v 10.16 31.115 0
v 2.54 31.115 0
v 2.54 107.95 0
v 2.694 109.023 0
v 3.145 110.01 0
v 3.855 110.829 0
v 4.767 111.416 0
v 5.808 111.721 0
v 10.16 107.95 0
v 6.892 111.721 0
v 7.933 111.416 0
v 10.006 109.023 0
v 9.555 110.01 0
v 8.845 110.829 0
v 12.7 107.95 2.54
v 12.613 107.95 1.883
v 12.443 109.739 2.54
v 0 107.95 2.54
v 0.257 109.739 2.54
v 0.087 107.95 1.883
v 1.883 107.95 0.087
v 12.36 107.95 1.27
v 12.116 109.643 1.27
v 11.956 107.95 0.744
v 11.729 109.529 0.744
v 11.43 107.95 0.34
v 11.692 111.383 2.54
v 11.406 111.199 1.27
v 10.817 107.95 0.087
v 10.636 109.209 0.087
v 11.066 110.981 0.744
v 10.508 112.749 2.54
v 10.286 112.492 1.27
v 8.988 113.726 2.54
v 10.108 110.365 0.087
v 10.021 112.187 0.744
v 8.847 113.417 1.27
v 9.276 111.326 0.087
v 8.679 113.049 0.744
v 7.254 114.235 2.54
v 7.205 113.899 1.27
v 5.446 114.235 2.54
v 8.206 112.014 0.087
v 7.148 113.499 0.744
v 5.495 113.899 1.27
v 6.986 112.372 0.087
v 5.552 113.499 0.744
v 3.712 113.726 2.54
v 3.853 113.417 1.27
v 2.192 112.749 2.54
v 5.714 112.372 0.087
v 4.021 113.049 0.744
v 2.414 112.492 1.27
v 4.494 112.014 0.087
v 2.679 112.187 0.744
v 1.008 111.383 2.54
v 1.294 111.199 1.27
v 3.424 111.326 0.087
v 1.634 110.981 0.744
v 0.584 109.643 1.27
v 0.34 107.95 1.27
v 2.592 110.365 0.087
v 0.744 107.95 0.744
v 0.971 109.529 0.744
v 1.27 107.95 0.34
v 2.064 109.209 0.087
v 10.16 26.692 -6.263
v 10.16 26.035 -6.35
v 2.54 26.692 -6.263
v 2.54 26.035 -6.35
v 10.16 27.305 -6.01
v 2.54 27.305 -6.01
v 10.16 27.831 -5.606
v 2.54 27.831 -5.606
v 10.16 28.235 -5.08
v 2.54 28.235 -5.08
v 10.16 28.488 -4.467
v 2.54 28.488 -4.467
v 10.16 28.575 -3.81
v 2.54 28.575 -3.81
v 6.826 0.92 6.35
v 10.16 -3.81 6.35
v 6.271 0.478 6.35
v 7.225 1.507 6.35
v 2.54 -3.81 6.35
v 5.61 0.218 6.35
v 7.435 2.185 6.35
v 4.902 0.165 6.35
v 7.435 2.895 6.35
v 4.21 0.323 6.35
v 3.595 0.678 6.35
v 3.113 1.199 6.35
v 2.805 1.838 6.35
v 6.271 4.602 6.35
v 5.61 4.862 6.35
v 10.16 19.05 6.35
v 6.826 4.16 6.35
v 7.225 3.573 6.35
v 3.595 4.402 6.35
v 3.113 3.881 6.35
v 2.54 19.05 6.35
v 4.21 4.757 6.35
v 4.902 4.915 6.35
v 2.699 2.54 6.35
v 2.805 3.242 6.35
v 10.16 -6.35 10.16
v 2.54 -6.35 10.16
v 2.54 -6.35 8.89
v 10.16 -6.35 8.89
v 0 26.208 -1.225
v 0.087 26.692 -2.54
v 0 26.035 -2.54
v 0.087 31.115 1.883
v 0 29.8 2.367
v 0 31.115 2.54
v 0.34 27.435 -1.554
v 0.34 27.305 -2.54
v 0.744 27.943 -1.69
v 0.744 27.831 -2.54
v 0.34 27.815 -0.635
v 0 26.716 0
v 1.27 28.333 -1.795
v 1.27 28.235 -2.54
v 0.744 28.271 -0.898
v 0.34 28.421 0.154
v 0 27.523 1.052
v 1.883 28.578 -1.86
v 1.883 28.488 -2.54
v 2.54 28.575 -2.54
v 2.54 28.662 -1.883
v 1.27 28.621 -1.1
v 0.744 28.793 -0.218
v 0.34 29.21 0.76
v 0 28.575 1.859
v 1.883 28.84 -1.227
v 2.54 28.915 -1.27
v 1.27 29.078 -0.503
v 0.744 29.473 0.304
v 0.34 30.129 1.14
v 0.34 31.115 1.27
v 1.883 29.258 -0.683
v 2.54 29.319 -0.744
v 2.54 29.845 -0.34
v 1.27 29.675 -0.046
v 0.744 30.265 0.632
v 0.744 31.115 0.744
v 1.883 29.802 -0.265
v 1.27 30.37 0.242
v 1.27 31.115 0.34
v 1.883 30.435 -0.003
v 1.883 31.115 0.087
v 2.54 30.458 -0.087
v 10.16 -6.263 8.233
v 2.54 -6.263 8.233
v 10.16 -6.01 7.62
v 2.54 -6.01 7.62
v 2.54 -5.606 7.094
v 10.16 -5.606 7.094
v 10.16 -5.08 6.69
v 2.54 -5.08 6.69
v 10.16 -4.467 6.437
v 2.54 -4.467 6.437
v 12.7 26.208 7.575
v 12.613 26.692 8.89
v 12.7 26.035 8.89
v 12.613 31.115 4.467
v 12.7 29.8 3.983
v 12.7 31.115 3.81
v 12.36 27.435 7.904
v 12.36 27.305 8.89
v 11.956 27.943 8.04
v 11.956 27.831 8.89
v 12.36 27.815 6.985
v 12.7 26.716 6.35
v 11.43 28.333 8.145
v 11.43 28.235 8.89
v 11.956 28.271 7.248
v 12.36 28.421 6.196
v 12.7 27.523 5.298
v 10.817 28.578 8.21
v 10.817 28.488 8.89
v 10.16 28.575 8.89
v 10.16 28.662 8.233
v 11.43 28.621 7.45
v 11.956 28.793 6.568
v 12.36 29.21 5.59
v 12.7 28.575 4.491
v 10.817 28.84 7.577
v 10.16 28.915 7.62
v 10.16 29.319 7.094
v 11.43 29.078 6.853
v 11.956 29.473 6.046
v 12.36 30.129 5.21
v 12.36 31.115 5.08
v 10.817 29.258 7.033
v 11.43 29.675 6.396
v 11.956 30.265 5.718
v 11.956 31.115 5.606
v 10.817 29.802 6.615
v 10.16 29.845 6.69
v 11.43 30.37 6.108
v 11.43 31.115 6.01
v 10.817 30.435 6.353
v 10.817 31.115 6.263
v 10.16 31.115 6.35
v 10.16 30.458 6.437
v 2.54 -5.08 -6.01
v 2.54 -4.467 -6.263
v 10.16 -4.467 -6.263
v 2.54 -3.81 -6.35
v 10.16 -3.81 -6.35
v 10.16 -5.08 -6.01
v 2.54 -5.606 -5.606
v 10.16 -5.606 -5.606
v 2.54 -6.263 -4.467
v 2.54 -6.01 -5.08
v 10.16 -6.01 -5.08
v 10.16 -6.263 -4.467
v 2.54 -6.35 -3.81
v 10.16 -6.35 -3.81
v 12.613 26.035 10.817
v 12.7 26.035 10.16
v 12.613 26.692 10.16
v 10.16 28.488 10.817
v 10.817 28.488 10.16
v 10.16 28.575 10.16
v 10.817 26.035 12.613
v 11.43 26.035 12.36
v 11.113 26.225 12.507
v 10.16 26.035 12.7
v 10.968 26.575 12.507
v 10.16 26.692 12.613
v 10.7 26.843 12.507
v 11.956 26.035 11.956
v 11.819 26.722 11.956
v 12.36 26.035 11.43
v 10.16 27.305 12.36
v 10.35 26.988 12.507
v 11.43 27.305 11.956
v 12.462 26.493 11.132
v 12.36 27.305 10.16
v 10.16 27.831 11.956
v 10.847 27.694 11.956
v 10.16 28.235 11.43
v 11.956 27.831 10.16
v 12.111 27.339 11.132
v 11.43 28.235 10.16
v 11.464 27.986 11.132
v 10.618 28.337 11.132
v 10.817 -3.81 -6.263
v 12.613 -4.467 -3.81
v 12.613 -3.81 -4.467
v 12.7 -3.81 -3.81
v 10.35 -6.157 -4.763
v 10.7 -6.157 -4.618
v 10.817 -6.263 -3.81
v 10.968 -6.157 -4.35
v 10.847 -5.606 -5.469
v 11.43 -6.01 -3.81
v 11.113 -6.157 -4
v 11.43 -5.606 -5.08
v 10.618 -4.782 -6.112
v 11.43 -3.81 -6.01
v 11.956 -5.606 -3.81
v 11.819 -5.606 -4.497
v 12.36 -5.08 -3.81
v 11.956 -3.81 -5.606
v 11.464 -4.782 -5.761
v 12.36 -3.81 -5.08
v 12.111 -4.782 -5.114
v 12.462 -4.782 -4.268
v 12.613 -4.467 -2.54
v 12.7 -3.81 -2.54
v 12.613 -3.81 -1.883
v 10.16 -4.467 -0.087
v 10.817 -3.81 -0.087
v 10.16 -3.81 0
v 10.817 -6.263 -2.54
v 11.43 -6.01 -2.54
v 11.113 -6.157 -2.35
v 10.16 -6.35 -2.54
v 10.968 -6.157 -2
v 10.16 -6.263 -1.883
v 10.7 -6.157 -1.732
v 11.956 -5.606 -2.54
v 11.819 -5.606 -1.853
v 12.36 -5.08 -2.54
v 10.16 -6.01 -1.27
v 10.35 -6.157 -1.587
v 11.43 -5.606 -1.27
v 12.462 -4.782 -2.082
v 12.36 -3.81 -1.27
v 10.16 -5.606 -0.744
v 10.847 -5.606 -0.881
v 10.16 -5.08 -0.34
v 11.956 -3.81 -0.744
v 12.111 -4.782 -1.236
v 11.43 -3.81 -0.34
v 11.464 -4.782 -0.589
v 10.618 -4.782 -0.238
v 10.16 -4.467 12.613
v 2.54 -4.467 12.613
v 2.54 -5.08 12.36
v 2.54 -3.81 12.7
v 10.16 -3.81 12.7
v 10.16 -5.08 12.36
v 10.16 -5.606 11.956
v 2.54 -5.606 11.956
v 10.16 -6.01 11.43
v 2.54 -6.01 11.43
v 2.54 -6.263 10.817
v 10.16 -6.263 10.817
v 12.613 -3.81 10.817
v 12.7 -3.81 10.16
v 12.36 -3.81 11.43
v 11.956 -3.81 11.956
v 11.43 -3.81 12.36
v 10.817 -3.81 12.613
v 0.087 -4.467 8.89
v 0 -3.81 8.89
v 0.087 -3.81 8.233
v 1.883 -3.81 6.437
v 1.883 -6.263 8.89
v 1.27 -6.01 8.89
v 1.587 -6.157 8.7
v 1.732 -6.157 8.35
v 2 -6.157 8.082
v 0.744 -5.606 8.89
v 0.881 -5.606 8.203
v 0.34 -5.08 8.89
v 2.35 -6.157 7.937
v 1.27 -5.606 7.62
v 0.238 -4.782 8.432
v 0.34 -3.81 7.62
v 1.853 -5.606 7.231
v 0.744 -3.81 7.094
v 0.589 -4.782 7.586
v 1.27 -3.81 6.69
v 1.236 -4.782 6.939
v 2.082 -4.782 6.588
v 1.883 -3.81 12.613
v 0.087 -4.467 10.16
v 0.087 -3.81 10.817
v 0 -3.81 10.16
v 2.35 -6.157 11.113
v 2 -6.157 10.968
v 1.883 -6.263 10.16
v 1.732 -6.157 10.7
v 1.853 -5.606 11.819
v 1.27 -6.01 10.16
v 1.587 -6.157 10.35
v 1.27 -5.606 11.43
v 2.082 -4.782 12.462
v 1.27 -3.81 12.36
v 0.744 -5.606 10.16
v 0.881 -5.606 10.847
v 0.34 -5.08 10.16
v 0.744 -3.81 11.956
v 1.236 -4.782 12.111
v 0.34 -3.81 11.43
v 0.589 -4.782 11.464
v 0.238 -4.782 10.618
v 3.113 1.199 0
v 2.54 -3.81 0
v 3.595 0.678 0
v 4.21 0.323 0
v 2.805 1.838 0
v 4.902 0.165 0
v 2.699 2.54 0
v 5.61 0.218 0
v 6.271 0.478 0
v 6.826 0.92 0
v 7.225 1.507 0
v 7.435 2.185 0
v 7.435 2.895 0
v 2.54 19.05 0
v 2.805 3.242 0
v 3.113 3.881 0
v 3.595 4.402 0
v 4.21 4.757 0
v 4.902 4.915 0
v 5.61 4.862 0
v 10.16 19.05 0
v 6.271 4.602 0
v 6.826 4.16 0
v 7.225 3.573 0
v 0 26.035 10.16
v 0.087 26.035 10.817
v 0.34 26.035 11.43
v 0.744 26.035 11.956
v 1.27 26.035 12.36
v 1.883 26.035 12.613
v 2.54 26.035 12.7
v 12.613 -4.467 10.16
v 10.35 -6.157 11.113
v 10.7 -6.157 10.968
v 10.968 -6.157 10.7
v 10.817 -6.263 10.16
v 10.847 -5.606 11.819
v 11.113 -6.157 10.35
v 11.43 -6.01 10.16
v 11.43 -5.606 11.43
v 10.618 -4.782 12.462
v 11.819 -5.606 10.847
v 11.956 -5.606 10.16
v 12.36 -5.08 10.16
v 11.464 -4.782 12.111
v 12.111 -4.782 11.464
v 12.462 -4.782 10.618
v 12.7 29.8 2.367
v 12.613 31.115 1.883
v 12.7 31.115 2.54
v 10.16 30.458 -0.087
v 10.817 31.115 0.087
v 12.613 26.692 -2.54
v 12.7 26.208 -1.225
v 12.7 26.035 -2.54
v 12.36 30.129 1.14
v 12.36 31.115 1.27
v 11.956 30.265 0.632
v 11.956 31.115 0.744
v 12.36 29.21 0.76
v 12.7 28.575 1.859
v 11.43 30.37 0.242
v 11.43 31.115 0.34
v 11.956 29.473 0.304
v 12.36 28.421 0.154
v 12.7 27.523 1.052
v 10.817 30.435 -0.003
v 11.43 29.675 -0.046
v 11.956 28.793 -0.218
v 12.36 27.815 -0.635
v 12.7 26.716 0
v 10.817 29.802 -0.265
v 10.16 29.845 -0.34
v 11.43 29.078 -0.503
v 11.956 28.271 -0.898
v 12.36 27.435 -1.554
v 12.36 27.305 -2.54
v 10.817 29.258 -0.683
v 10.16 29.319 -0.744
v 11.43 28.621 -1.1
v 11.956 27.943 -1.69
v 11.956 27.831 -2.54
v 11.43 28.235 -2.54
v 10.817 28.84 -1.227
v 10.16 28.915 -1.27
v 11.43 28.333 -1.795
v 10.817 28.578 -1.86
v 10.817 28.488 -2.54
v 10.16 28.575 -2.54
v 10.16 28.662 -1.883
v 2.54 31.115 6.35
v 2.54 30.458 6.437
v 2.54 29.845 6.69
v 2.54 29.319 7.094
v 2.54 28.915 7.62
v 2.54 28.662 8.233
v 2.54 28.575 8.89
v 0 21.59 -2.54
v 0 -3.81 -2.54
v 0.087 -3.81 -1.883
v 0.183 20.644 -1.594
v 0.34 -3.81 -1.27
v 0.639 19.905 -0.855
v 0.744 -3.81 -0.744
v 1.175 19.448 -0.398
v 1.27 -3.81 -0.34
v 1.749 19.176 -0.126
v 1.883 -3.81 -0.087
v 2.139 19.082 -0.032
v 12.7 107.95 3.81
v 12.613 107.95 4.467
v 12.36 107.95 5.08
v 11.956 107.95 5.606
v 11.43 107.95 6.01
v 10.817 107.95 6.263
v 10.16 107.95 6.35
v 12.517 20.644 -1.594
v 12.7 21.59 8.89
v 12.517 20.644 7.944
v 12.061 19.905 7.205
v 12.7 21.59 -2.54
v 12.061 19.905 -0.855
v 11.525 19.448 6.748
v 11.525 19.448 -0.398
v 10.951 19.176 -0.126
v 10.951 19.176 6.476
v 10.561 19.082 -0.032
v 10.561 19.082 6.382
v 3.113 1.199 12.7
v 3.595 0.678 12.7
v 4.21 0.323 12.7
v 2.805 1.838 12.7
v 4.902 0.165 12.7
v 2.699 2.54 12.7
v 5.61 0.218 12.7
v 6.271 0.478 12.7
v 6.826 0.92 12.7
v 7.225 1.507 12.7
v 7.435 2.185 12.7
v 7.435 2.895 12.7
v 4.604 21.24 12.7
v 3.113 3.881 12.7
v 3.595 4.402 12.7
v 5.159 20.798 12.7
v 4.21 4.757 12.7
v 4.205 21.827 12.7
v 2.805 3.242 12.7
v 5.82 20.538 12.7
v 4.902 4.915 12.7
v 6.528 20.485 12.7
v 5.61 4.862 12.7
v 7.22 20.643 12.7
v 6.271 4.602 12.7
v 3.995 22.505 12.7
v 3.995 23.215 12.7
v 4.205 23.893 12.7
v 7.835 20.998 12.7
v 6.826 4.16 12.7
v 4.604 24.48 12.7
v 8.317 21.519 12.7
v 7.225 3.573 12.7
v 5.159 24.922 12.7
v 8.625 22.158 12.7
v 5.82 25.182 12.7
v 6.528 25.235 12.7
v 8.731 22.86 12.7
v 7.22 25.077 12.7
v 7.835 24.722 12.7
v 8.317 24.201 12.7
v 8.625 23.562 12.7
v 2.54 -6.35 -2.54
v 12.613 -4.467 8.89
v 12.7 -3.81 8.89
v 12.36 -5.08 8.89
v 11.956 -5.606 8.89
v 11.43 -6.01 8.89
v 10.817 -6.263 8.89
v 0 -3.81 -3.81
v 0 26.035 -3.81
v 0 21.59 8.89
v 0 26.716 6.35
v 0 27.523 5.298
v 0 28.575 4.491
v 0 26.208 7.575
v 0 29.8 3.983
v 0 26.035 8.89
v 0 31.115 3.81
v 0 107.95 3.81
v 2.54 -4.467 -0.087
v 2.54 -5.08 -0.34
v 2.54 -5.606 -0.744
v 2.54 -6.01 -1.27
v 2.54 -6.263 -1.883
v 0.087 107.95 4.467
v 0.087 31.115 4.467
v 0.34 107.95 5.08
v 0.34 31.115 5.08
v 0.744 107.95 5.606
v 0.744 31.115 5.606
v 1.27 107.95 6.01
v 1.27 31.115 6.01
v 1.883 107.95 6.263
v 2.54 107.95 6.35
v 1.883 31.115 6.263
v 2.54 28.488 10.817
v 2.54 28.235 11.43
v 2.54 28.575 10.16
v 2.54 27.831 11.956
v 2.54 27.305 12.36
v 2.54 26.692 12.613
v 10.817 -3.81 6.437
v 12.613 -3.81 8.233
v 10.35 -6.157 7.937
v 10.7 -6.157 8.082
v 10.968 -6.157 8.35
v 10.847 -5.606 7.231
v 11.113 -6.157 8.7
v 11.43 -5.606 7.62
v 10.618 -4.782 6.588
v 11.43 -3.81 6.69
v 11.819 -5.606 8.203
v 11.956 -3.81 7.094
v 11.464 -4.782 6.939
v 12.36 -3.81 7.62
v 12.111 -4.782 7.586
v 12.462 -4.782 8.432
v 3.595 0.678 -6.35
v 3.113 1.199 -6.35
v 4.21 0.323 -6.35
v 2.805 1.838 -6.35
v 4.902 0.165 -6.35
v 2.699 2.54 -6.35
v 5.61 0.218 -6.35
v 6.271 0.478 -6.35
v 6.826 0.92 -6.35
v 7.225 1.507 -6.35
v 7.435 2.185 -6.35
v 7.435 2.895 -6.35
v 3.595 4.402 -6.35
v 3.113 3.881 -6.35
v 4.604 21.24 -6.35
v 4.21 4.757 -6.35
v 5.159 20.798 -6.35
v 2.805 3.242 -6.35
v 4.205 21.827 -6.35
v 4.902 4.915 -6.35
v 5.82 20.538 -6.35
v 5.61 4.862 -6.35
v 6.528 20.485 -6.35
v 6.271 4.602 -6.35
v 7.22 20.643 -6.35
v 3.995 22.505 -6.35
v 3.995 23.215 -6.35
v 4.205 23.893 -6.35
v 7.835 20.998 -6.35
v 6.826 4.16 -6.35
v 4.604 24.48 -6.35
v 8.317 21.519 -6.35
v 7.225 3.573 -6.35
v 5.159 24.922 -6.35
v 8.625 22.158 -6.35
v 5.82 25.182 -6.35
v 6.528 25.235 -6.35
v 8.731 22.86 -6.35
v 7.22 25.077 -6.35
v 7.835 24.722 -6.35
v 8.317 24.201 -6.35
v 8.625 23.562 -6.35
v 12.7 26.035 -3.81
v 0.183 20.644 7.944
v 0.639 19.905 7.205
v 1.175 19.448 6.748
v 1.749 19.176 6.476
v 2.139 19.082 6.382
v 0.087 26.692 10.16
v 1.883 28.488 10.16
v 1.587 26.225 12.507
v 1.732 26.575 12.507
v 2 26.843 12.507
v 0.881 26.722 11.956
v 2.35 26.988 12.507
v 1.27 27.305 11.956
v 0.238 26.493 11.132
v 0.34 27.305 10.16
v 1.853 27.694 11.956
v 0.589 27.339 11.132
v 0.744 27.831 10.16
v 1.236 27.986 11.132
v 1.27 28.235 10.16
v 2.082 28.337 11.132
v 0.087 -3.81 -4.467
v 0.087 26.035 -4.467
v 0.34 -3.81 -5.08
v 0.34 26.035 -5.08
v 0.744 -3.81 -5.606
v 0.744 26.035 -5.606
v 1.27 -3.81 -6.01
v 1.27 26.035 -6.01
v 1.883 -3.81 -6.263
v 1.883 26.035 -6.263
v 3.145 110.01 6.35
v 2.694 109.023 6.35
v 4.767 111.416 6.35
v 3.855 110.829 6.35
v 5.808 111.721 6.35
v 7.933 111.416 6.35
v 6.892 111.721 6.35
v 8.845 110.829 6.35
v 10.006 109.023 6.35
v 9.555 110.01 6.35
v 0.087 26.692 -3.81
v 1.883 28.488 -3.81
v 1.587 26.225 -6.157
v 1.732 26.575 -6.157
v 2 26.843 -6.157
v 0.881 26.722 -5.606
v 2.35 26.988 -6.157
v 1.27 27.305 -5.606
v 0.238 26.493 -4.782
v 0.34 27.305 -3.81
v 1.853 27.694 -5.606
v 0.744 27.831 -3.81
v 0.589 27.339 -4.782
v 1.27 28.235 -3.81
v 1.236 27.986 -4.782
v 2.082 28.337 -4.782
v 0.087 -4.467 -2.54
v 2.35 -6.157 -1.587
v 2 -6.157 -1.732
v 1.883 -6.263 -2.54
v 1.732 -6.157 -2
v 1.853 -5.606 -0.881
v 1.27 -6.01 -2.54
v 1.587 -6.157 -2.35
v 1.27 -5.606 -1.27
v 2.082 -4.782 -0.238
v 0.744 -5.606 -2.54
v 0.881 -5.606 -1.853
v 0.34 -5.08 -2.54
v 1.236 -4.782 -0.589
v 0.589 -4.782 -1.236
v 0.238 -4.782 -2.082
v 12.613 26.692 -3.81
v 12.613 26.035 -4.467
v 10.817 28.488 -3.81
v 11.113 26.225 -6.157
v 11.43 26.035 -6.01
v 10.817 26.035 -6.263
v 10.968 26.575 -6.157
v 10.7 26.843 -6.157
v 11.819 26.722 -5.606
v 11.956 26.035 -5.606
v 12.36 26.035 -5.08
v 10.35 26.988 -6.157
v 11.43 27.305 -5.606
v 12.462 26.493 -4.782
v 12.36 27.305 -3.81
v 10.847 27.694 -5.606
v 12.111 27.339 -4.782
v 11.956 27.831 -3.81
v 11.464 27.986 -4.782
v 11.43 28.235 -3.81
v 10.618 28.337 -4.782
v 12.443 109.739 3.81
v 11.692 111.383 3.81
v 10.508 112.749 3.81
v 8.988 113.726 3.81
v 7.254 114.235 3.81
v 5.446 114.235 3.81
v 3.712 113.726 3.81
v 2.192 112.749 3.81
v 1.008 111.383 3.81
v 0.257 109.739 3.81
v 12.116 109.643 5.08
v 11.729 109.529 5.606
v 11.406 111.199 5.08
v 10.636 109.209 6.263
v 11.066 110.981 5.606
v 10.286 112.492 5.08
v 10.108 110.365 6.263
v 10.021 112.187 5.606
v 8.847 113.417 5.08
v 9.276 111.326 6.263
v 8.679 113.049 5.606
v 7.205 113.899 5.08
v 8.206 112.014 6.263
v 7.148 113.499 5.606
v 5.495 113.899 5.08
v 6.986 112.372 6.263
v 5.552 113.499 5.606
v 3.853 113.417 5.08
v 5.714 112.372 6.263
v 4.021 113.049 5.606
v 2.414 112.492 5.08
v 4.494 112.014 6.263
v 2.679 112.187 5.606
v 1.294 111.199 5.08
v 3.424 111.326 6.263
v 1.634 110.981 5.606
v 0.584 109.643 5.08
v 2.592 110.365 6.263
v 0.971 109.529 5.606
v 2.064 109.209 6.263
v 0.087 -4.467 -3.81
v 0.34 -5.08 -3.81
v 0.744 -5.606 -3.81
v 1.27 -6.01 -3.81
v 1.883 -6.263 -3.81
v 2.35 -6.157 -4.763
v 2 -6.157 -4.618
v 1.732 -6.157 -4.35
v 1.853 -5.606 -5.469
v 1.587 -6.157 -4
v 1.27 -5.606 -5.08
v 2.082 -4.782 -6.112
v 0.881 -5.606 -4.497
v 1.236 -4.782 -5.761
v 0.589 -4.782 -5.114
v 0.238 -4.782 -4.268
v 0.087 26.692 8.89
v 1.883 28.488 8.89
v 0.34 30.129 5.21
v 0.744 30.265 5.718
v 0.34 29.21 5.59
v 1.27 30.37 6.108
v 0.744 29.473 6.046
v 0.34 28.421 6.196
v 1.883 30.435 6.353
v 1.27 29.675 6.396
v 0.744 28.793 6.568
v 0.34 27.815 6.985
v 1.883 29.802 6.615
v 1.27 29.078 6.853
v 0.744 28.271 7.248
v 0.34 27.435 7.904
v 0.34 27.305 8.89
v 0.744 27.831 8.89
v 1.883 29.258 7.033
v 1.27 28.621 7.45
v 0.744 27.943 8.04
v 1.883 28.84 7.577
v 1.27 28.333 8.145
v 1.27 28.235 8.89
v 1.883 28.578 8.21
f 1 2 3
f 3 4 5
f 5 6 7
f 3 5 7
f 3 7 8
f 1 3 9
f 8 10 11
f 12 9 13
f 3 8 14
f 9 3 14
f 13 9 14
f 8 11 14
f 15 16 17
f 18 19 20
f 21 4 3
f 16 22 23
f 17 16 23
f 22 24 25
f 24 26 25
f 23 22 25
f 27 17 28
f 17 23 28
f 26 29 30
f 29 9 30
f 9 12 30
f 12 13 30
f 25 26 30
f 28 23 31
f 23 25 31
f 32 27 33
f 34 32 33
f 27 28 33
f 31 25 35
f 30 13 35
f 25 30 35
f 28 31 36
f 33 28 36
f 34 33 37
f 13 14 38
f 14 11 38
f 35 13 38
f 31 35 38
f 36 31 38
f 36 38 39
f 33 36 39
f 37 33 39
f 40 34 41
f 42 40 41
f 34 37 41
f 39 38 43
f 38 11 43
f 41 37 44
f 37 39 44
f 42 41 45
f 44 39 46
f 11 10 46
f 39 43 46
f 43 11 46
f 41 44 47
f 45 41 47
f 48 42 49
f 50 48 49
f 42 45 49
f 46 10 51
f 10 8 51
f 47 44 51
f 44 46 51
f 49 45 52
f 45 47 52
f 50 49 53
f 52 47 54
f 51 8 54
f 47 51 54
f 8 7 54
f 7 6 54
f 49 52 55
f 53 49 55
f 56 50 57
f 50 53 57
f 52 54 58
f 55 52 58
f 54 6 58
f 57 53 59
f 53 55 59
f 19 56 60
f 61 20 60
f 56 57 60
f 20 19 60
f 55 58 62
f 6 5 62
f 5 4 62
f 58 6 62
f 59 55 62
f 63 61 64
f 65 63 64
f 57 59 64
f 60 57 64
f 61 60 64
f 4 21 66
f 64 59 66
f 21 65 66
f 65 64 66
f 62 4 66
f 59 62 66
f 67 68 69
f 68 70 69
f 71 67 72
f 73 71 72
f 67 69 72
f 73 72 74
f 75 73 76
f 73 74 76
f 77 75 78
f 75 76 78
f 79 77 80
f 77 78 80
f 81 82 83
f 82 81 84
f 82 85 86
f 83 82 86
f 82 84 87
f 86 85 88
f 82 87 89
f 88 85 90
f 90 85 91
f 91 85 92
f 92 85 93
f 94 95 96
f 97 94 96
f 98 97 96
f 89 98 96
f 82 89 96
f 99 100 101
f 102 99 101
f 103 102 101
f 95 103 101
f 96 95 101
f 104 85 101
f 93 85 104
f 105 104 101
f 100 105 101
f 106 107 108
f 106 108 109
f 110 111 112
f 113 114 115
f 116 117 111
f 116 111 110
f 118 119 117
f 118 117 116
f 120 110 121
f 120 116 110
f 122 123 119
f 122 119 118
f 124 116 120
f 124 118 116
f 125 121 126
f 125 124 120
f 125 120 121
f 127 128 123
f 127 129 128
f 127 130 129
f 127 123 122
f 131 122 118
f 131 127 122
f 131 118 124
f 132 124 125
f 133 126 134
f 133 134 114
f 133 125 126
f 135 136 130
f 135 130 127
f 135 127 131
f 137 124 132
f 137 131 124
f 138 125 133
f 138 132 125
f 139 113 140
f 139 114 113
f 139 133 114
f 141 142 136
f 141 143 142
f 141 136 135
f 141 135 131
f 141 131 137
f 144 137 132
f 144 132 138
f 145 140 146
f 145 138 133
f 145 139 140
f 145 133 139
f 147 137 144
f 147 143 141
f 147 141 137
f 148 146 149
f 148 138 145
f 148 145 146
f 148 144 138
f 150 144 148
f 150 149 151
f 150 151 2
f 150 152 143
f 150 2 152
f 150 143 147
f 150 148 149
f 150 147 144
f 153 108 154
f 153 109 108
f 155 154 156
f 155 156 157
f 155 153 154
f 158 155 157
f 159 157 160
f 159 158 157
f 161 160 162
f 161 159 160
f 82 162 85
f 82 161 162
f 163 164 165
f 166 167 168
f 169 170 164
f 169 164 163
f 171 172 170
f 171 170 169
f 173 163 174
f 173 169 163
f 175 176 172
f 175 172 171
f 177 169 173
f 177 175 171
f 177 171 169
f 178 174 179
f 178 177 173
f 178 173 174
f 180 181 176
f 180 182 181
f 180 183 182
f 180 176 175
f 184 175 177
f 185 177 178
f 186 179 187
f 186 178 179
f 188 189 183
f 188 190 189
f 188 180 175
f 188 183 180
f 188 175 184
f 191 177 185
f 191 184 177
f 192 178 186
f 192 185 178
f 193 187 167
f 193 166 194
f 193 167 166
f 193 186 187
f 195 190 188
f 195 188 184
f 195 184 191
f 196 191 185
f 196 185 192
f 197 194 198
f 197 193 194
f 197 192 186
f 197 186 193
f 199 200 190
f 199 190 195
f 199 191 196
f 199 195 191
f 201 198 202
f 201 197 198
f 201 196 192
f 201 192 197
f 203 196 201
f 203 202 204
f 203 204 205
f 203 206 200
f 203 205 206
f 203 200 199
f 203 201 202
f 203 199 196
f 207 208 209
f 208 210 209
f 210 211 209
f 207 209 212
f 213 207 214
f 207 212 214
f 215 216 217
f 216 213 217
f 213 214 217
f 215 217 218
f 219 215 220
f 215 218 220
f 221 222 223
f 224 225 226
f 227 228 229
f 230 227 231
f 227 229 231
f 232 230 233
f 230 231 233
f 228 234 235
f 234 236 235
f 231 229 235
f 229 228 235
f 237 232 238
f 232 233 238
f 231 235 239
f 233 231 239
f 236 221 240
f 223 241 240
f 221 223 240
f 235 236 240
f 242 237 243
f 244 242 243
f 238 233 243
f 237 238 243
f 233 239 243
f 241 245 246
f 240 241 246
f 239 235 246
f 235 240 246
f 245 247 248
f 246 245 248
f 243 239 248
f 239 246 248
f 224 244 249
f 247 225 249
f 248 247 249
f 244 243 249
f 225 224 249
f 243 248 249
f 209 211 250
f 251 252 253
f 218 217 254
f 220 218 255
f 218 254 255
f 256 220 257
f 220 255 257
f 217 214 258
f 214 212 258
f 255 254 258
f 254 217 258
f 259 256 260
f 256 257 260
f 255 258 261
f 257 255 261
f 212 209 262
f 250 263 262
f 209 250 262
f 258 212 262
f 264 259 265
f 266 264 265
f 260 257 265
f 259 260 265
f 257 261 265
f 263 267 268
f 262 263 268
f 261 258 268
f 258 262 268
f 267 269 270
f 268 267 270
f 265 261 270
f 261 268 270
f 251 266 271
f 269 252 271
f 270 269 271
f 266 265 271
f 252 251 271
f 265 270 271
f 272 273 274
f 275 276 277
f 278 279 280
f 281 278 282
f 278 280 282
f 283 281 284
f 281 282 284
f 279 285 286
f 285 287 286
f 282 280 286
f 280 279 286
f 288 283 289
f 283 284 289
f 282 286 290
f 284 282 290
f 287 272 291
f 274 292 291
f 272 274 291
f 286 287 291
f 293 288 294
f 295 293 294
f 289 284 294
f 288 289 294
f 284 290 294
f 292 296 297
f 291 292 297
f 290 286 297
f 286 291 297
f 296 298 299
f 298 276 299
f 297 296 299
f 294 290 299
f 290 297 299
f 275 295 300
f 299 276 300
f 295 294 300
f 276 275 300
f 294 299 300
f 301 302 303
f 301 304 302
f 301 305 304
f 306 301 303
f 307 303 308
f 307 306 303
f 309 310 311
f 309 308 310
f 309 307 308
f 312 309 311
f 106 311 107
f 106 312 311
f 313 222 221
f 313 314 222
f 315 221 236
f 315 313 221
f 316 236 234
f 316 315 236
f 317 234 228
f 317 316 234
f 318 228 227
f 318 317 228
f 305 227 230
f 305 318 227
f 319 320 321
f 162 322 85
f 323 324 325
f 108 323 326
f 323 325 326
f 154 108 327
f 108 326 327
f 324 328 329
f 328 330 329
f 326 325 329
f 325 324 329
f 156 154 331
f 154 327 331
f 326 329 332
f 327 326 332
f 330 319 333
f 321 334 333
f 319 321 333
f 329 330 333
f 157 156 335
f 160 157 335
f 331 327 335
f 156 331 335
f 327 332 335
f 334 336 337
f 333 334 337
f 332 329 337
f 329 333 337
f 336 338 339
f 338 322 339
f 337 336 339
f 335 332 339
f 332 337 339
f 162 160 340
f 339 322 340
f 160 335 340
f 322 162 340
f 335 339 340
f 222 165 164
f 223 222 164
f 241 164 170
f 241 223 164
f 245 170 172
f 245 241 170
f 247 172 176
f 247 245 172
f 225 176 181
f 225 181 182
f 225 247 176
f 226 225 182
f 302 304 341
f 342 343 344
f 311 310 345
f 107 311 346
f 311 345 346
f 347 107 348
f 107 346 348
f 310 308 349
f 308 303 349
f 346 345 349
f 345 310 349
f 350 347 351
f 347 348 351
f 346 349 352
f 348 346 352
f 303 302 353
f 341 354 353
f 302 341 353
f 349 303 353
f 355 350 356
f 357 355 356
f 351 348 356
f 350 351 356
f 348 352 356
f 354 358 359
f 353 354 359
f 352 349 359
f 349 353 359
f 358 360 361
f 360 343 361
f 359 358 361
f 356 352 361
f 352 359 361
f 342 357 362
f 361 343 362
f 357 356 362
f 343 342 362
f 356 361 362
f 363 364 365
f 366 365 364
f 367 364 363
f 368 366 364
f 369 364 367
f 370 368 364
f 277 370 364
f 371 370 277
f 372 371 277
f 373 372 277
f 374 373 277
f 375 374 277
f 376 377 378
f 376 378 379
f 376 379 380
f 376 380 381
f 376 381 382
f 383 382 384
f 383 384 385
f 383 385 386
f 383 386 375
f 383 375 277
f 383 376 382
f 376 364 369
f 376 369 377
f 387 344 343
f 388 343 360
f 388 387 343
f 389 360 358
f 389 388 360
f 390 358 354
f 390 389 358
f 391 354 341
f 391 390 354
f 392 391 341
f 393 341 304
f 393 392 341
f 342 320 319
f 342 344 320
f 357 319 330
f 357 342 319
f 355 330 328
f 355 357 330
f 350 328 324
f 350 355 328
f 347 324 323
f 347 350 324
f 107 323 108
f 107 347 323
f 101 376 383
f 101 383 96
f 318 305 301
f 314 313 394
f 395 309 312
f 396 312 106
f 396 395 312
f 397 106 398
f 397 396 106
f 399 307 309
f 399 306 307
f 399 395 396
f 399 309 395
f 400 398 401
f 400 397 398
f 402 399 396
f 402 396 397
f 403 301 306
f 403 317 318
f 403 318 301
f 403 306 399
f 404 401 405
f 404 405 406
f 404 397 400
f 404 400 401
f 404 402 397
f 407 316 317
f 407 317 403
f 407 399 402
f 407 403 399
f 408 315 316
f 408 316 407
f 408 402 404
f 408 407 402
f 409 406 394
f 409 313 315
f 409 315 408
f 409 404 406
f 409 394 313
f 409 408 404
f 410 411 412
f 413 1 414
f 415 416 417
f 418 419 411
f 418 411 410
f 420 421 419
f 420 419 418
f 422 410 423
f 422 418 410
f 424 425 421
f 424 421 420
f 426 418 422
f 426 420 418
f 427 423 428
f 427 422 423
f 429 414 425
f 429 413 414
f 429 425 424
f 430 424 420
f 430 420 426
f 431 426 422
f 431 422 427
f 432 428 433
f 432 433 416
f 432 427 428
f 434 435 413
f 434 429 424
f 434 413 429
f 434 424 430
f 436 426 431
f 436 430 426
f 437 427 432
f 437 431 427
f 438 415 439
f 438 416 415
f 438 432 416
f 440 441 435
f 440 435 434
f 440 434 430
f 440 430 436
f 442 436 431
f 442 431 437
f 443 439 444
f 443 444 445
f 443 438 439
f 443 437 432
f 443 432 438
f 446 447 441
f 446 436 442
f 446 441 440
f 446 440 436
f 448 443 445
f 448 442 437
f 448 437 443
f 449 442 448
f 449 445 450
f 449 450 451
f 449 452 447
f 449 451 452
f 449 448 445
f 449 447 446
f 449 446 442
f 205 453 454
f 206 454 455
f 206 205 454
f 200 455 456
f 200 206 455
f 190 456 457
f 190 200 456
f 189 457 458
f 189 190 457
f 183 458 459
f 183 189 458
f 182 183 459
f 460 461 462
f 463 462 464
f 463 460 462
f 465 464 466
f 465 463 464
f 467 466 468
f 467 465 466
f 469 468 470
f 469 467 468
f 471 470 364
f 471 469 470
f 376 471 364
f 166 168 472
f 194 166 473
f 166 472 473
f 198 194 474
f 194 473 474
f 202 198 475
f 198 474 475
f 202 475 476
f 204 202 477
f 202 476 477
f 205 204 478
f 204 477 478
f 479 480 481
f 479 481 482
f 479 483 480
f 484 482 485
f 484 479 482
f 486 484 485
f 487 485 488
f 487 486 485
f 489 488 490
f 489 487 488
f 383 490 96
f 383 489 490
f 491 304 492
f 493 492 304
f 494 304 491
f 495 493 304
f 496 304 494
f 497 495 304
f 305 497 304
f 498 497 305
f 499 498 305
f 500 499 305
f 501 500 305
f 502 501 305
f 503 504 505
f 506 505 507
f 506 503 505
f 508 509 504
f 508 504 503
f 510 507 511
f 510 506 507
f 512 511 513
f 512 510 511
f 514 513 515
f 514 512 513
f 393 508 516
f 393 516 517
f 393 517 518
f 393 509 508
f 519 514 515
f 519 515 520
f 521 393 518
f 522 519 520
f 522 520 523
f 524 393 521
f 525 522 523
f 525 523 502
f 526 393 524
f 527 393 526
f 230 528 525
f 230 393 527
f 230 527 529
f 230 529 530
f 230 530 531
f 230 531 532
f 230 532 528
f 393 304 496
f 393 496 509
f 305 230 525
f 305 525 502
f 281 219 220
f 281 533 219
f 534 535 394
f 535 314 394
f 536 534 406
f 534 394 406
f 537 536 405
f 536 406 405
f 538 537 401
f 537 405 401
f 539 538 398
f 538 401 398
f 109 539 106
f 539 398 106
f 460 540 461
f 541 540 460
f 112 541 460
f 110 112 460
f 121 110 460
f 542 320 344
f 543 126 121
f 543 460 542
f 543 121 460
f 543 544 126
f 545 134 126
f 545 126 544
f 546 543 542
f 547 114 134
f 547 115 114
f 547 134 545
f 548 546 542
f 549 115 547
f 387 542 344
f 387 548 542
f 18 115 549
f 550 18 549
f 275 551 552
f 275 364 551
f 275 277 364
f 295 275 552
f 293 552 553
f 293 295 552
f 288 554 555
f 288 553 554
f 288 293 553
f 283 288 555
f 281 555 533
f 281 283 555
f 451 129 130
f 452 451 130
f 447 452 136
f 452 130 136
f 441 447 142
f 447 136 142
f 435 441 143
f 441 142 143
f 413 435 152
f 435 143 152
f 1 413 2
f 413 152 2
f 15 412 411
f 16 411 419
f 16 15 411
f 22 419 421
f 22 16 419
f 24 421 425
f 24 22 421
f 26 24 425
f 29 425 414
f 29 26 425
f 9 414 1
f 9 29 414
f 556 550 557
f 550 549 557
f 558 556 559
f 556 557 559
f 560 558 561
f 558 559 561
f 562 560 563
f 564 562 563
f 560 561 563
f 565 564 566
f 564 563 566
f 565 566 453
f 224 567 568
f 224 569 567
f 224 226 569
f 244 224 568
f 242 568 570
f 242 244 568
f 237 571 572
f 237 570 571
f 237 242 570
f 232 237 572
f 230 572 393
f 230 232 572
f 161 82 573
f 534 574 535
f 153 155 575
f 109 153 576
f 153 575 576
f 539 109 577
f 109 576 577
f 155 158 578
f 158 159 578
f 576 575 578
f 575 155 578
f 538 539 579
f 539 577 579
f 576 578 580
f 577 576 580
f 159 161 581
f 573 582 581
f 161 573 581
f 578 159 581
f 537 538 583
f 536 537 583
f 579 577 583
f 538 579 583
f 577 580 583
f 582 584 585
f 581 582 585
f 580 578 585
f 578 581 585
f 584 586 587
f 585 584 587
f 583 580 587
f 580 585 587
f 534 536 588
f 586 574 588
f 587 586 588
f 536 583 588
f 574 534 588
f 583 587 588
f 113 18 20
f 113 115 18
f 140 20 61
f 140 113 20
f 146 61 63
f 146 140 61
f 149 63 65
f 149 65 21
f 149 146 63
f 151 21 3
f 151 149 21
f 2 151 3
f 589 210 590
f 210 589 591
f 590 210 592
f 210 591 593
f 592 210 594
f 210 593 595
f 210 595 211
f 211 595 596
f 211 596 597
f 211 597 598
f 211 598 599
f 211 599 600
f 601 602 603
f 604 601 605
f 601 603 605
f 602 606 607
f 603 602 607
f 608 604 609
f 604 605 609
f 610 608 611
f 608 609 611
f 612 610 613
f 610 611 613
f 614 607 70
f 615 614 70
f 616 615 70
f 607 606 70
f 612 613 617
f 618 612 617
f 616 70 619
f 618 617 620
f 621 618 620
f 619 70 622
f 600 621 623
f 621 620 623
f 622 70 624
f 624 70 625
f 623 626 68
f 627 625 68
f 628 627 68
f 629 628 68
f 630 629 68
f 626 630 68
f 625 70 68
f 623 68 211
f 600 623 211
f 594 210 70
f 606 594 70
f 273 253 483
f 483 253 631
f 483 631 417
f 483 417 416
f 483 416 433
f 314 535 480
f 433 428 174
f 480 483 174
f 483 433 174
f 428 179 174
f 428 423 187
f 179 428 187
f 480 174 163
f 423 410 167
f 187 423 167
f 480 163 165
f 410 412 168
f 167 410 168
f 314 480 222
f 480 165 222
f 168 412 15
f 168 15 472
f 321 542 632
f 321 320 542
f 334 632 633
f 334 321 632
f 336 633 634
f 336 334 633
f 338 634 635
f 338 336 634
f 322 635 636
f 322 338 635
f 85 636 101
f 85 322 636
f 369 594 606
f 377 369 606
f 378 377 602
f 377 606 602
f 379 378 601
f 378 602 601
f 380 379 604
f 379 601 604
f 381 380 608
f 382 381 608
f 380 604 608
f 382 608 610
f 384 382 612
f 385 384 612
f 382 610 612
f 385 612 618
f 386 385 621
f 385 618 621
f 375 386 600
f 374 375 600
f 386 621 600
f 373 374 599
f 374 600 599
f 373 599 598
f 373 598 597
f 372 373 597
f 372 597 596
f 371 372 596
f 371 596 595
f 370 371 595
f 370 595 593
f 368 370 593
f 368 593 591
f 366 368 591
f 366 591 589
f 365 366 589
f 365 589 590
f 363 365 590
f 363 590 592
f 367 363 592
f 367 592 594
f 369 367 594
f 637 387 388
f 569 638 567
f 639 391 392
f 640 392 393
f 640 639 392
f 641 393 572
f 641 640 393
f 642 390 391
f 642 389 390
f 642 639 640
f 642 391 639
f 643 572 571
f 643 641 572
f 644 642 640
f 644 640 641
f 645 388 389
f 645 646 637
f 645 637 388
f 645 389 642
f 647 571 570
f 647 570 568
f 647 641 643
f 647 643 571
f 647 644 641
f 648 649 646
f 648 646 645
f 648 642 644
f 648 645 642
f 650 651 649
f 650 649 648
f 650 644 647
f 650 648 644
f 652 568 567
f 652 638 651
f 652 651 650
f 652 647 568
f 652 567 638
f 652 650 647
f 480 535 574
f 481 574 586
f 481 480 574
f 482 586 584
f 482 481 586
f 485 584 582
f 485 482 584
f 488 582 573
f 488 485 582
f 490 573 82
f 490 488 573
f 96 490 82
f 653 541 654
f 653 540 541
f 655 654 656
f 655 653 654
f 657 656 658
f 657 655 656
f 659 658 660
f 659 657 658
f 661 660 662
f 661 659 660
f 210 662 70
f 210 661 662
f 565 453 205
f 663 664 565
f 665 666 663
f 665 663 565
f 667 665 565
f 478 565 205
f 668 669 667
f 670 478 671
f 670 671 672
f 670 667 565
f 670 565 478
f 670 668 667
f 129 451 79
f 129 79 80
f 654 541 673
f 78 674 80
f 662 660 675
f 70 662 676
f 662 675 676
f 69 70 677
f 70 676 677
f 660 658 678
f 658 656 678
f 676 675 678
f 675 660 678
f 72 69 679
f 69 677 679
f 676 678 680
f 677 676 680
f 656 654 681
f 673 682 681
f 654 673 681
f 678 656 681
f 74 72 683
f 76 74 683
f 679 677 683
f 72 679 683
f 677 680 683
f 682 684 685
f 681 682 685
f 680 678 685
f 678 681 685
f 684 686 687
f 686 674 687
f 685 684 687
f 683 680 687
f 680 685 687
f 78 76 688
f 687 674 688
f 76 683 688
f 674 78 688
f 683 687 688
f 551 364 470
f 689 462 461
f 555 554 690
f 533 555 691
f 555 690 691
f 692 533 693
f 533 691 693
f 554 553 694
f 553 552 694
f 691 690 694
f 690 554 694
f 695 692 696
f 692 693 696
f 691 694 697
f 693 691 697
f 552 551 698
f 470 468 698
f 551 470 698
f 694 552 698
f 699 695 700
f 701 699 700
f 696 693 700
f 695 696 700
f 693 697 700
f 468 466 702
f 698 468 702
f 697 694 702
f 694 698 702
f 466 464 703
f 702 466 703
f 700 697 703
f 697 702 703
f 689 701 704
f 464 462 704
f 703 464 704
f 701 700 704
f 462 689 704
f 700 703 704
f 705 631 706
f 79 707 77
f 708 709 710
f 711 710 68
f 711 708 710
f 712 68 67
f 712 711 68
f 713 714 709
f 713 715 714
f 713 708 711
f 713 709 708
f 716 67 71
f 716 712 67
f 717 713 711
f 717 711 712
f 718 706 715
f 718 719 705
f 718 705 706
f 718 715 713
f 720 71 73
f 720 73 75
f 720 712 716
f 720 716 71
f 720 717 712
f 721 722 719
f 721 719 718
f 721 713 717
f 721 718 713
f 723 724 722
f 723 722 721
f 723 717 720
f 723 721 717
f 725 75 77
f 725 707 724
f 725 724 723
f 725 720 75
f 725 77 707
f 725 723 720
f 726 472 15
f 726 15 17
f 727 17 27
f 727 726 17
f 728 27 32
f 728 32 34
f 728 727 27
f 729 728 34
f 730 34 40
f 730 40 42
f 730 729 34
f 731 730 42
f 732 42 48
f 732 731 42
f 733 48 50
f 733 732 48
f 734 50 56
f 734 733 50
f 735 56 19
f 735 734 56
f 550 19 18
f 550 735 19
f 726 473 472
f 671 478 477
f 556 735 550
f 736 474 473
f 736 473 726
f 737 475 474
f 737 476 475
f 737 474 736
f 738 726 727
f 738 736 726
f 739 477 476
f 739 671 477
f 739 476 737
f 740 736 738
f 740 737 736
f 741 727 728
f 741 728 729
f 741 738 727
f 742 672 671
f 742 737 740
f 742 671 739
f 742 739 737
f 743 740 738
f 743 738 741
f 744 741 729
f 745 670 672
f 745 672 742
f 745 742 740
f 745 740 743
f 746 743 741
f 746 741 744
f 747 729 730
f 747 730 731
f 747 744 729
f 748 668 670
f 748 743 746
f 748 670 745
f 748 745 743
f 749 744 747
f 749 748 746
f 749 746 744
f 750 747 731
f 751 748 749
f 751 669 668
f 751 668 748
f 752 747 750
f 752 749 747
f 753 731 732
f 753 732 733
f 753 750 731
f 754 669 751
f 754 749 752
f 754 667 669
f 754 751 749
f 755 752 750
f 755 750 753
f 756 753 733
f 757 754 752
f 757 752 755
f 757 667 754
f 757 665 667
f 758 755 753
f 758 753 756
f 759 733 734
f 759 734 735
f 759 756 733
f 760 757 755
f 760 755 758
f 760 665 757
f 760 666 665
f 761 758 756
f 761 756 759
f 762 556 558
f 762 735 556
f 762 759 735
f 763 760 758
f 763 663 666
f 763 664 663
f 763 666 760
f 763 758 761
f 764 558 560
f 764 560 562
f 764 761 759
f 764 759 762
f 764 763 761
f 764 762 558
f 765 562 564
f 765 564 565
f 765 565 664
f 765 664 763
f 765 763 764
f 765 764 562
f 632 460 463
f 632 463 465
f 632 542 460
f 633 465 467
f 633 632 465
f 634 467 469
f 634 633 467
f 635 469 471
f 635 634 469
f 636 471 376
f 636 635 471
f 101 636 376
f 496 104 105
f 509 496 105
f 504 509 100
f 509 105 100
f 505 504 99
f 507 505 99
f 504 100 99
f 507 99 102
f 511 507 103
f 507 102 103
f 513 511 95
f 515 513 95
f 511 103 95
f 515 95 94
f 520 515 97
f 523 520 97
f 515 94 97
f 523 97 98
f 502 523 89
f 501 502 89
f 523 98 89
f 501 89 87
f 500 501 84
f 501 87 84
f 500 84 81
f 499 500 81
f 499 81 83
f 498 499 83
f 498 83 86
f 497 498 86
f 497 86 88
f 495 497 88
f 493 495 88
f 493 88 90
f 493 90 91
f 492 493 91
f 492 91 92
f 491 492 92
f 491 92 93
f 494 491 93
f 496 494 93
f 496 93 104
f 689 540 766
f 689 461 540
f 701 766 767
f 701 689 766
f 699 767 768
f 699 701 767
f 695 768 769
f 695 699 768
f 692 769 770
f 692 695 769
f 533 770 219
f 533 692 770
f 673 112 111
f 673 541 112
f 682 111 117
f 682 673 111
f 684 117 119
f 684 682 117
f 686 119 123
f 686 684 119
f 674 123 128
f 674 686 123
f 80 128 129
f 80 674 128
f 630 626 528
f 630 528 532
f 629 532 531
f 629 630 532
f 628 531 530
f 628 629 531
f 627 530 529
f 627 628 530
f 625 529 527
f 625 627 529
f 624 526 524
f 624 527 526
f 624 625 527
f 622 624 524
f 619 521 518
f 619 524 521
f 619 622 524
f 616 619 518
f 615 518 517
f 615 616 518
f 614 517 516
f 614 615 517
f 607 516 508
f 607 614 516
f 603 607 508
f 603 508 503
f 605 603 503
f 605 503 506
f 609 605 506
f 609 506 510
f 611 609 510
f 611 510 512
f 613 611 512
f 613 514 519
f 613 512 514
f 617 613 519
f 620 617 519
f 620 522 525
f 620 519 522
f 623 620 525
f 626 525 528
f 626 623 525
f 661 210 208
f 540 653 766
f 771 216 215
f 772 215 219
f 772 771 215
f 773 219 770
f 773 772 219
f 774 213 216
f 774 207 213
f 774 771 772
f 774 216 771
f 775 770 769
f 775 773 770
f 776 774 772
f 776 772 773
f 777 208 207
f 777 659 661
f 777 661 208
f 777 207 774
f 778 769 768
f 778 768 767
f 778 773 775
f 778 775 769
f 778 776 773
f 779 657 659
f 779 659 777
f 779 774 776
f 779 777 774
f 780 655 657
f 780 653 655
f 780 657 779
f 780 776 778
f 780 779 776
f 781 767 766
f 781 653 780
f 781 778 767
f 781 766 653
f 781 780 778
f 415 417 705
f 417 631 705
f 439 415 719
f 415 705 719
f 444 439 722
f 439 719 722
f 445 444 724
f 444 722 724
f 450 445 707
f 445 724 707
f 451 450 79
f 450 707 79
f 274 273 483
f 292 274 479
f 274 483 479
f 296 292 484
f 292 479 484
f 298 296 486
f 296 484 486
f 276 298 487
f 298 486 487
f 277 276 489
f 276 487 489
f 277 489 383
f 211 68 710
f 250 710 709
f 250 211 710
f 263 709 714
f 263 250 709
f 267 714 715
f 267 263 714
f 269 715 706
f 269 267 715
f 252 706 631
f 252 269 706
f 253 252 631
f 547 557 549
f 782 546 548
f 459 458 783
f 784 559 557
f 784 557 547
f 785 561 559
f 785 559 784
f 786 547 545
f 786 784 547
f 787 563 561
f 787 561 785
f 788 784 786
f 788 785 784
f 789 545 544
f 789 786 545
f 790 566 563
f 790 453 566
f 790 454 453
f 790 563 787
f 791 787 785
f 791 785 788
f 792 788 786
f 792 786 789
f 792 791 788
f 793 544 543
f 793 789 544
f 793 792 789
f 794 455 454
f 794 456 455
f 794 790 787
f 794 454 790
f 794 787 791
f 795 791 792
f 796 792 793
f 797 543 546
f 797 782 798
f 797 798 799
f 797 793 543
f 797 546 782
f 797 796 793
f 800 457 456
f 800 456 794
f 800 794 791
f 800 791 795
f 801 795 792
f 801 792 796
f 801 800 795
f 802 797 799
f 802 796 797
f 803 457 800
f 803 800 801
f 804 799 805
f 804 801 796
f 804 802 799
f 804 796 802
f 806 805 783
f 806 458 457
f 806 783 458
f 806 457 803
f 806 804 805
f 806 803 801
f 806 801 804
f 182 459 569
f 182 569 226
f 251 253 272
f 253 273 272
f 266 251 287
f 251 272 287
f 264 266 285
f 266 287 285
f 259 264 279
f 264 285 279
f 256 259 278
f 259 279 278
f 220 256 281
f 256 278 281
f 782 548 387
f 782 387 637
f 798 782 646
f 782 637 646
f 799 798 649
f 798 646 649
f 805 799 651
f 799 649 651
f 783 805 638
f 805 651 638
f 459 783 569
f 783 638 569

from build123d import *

# Parameters (mm, degrees)
SKETCH1_W                       = 12.7
SKETCH1_H                       = 114.3
BOSS_EXTRUDE1_DEPTH             = 6.35
SKETCH4_W                       = 12.7
SKETCH4_H                       = 28.575
BOSS_EXTRUDE3_DEPTH             = 6.35
SKETCH5_W                       = 12.7
SKETCH5_H                       = 28.575
BOSS_EXTRUDE4_DEPTH             = 6.35
SKETCH7_W                       = 6.35
SKETCH7_H                       = 19.05
CUT_EXTRUDE2_DEPTH              = 32.512
CUT_EXTRUDE3_DEPTH              = 116.702506455
CUT_EXTRUDE3_DEPTH_BACK         = 116.702506455
SKETCH8_R                       = 2.38125
FILLET5_RADIUS                  = 6.35
FILLET5_LENGTH                  = 6.35
SKETCH9_W                       = 12.7
SKETCH9_H                       = 6.35
BOSS_EXTRUDE5_DEPTH             = 6.35
FILLET6_R                       = 2.54
F_3_16_0_1875_DOWEL_HOLE1_D     = 4.7625
F_3_16_0_1875_DOWEL_HOLE1_DEPTH = 23.368
F_3_16_0_1875_DOWEL_HOLE1_TIP   = 1.430799349


with BuildPart() as part:
    # Sketch1 → Boss-Extrude1 (new body)
    with BuildSketch(Plane.XY):
        with Locations((6.35, 57.15)):
            Rectangle(SKETCH1_W, SKETCH1_H)
    extrude(amount=BOSS_EXTRUDE1_DEPTH)

    # Sketch4 → Boss-Extrude3 (add)
    with BuildSketch(Plane.XY.offset(6.35)):
        with Locations((6.35, 14.2875)):
            Rectangle(SKETCH4_W, SKETCH4_H)
    extrude(amount=BOSS_EXTRUDE3_DEPTH)

    # Sketch5 → Boss-Extrude4 (add)
    with BuildSketch(Plane(origin=(0, 0, 0), x_dir=(-1, 0, 0), z_dir=(0, 0, -1))):
        with Locations((-6.35, 14.2875)):
            Rectangle(SKETCH5_W, SKETCH5_H)
    extrude(amount=BOSS_EXTRUDE4_DEPTH)

    # Sketch7 → Cut-Extrude2 (cut)
    with BuildSketch(Plane.ZY):
        with Locations((3.175, 9.525)):
            Rectangle(SKETCH7_W, SKETCH7_H)
    extrude(amount=-CUT_EXTRUDE2_DEPTH, mode=Mode.SUBTRACT)

    # Sketch8 → Cut-Extrude3 (cut, two sides: drawn at the far end of the back side and taken through both)
    with BuildSketch(Plane.XY.offset(6.35).offset(-CUT_EXTRUDE3_DEPTH_BACK)):
        with Locations((6.35, 22.86)):
            Circle(SKETCH8_R)
    extrude(amount=CUT_EXTRUDE3_DEPTH + CUT_EXTRUDE3_DEPTH_BACK, mode=Mode.SUBTRACT)

    # Fillet5: full round fillet: the end face becomes a half cylinder, R = half its width
    fillet5_face = Plane((6.35, 114.3, 3.175), x_dir=(0, 0, 1), z_dir=(0, 1, 0))  # on the end face: x along it, z out of the body
    fillet5_slab = fillet5_face.offset(-FILLET5_RADIUS / 2) * Box(FILLET5_LENGTH, 2 * FILLET5_RADIUS, FILLET5_RADIUS, mode=Mode.PRIVATE)  # the body's end, R deep
    fillet5_round = Plane((6.35, 107.95, 3.175), x_dir=(0, 1, 0), z_dir=(0, 0, 1)) * Cylinder(FILLET5_RADIUS, FILLET5_LENGTH, mode=Mode.PRIVATE)  # its axis R under the face
    add(fillet5_slab - fillet5_round, mode=Mode.SUBTRACT)

    # Sketch9 → Boss-Extrude5 (add)
    with BuildSketch(Plane.XZ):
        with Locations((6.35, -3.175)):
            Rectangle(SKETCH9_W, SKETCH9_H)
        with Locations((6.35, 9.525)):
            Rectangle(SKETCH9_W, SKETCH9_H)
    extrude(amount=BOSS_EXTRUDE5_DEPTH)

    # Fillet6
    fillet6_edges = [part.edges().sort_by_distance(p)[0] for p in [
        (12.7, 68.2625, 6.35),
        (0, 28.575, 9.525),
        (6.35, 28.575, 6.35),
        (12.7, 28.575, 9.525),
        (0, 11.1125, 12.7),
        (12.7, 11.1125, 12.7),
        (6.35, 28.575, 12.7),
        (12.7, 68.2625, 0),
        (12.7, 28.575, -3.175),
        (6.35, 28.575, 0),
        (0, 28.575, -3.175),
        (12.7, 14.2875, -6.35),
        (0, 14.2875, -6.35),
        (6.35, 28.575, -6.35),
        (12.7, 9.525, 6.35),
        (12.7, 19.05, 3.175),
        (12.7, 9.525, 0),
        (0, 9.525, 0),
        (0, 9.525, 6.35),
        (0, 19.05, 3.175),
        (0, 68.2625, 6.35),
        (0, 68.2625, 0),
        (6.35, 114.3, 0),
        (6.35, 114.3, 6.35),
        (6.35, -6.35, -6.35),
        (12.7, -6.35, -3.175),
        (6.35, -6.35, 0),
        (0, -6.35, -3.175),
        (6.35, -6.35, 12.7),
        (0, -6.35, 9.525),
        (6.35, -6.35, 6.35),
        (12.7, -6.35, 9.525),
    ]]
    fillet(fillet6_edges, radius=FILLET6_R)

    # 3/16 (0.1875) Dowel Hole1
    with Locations(Plane.XY.offset(12.7)):
        with Locations((5.08, 2.54)):
            Hole(F_3_16_0_1875_DOWEL_HOLE1_D / 2, depth=F_3_16_0_1875_DOWEL_HOLE1_DEPTH)
            with Locations((0, 0, -(F_3_16_0_1875_DOWEL_HOLE1_DEPTH + F_3_16_0_1875_DOWEL_HOLE1_TIP / 2))):  # 118° drill point
                Cone(0, F_3_16_0_1875_DOWEL_HOLE1_D / 2, F_3_16_0_1875_DOWEL_HOLE1_TIP, mode=Mode.SUBTRACT)


solid = part.part
